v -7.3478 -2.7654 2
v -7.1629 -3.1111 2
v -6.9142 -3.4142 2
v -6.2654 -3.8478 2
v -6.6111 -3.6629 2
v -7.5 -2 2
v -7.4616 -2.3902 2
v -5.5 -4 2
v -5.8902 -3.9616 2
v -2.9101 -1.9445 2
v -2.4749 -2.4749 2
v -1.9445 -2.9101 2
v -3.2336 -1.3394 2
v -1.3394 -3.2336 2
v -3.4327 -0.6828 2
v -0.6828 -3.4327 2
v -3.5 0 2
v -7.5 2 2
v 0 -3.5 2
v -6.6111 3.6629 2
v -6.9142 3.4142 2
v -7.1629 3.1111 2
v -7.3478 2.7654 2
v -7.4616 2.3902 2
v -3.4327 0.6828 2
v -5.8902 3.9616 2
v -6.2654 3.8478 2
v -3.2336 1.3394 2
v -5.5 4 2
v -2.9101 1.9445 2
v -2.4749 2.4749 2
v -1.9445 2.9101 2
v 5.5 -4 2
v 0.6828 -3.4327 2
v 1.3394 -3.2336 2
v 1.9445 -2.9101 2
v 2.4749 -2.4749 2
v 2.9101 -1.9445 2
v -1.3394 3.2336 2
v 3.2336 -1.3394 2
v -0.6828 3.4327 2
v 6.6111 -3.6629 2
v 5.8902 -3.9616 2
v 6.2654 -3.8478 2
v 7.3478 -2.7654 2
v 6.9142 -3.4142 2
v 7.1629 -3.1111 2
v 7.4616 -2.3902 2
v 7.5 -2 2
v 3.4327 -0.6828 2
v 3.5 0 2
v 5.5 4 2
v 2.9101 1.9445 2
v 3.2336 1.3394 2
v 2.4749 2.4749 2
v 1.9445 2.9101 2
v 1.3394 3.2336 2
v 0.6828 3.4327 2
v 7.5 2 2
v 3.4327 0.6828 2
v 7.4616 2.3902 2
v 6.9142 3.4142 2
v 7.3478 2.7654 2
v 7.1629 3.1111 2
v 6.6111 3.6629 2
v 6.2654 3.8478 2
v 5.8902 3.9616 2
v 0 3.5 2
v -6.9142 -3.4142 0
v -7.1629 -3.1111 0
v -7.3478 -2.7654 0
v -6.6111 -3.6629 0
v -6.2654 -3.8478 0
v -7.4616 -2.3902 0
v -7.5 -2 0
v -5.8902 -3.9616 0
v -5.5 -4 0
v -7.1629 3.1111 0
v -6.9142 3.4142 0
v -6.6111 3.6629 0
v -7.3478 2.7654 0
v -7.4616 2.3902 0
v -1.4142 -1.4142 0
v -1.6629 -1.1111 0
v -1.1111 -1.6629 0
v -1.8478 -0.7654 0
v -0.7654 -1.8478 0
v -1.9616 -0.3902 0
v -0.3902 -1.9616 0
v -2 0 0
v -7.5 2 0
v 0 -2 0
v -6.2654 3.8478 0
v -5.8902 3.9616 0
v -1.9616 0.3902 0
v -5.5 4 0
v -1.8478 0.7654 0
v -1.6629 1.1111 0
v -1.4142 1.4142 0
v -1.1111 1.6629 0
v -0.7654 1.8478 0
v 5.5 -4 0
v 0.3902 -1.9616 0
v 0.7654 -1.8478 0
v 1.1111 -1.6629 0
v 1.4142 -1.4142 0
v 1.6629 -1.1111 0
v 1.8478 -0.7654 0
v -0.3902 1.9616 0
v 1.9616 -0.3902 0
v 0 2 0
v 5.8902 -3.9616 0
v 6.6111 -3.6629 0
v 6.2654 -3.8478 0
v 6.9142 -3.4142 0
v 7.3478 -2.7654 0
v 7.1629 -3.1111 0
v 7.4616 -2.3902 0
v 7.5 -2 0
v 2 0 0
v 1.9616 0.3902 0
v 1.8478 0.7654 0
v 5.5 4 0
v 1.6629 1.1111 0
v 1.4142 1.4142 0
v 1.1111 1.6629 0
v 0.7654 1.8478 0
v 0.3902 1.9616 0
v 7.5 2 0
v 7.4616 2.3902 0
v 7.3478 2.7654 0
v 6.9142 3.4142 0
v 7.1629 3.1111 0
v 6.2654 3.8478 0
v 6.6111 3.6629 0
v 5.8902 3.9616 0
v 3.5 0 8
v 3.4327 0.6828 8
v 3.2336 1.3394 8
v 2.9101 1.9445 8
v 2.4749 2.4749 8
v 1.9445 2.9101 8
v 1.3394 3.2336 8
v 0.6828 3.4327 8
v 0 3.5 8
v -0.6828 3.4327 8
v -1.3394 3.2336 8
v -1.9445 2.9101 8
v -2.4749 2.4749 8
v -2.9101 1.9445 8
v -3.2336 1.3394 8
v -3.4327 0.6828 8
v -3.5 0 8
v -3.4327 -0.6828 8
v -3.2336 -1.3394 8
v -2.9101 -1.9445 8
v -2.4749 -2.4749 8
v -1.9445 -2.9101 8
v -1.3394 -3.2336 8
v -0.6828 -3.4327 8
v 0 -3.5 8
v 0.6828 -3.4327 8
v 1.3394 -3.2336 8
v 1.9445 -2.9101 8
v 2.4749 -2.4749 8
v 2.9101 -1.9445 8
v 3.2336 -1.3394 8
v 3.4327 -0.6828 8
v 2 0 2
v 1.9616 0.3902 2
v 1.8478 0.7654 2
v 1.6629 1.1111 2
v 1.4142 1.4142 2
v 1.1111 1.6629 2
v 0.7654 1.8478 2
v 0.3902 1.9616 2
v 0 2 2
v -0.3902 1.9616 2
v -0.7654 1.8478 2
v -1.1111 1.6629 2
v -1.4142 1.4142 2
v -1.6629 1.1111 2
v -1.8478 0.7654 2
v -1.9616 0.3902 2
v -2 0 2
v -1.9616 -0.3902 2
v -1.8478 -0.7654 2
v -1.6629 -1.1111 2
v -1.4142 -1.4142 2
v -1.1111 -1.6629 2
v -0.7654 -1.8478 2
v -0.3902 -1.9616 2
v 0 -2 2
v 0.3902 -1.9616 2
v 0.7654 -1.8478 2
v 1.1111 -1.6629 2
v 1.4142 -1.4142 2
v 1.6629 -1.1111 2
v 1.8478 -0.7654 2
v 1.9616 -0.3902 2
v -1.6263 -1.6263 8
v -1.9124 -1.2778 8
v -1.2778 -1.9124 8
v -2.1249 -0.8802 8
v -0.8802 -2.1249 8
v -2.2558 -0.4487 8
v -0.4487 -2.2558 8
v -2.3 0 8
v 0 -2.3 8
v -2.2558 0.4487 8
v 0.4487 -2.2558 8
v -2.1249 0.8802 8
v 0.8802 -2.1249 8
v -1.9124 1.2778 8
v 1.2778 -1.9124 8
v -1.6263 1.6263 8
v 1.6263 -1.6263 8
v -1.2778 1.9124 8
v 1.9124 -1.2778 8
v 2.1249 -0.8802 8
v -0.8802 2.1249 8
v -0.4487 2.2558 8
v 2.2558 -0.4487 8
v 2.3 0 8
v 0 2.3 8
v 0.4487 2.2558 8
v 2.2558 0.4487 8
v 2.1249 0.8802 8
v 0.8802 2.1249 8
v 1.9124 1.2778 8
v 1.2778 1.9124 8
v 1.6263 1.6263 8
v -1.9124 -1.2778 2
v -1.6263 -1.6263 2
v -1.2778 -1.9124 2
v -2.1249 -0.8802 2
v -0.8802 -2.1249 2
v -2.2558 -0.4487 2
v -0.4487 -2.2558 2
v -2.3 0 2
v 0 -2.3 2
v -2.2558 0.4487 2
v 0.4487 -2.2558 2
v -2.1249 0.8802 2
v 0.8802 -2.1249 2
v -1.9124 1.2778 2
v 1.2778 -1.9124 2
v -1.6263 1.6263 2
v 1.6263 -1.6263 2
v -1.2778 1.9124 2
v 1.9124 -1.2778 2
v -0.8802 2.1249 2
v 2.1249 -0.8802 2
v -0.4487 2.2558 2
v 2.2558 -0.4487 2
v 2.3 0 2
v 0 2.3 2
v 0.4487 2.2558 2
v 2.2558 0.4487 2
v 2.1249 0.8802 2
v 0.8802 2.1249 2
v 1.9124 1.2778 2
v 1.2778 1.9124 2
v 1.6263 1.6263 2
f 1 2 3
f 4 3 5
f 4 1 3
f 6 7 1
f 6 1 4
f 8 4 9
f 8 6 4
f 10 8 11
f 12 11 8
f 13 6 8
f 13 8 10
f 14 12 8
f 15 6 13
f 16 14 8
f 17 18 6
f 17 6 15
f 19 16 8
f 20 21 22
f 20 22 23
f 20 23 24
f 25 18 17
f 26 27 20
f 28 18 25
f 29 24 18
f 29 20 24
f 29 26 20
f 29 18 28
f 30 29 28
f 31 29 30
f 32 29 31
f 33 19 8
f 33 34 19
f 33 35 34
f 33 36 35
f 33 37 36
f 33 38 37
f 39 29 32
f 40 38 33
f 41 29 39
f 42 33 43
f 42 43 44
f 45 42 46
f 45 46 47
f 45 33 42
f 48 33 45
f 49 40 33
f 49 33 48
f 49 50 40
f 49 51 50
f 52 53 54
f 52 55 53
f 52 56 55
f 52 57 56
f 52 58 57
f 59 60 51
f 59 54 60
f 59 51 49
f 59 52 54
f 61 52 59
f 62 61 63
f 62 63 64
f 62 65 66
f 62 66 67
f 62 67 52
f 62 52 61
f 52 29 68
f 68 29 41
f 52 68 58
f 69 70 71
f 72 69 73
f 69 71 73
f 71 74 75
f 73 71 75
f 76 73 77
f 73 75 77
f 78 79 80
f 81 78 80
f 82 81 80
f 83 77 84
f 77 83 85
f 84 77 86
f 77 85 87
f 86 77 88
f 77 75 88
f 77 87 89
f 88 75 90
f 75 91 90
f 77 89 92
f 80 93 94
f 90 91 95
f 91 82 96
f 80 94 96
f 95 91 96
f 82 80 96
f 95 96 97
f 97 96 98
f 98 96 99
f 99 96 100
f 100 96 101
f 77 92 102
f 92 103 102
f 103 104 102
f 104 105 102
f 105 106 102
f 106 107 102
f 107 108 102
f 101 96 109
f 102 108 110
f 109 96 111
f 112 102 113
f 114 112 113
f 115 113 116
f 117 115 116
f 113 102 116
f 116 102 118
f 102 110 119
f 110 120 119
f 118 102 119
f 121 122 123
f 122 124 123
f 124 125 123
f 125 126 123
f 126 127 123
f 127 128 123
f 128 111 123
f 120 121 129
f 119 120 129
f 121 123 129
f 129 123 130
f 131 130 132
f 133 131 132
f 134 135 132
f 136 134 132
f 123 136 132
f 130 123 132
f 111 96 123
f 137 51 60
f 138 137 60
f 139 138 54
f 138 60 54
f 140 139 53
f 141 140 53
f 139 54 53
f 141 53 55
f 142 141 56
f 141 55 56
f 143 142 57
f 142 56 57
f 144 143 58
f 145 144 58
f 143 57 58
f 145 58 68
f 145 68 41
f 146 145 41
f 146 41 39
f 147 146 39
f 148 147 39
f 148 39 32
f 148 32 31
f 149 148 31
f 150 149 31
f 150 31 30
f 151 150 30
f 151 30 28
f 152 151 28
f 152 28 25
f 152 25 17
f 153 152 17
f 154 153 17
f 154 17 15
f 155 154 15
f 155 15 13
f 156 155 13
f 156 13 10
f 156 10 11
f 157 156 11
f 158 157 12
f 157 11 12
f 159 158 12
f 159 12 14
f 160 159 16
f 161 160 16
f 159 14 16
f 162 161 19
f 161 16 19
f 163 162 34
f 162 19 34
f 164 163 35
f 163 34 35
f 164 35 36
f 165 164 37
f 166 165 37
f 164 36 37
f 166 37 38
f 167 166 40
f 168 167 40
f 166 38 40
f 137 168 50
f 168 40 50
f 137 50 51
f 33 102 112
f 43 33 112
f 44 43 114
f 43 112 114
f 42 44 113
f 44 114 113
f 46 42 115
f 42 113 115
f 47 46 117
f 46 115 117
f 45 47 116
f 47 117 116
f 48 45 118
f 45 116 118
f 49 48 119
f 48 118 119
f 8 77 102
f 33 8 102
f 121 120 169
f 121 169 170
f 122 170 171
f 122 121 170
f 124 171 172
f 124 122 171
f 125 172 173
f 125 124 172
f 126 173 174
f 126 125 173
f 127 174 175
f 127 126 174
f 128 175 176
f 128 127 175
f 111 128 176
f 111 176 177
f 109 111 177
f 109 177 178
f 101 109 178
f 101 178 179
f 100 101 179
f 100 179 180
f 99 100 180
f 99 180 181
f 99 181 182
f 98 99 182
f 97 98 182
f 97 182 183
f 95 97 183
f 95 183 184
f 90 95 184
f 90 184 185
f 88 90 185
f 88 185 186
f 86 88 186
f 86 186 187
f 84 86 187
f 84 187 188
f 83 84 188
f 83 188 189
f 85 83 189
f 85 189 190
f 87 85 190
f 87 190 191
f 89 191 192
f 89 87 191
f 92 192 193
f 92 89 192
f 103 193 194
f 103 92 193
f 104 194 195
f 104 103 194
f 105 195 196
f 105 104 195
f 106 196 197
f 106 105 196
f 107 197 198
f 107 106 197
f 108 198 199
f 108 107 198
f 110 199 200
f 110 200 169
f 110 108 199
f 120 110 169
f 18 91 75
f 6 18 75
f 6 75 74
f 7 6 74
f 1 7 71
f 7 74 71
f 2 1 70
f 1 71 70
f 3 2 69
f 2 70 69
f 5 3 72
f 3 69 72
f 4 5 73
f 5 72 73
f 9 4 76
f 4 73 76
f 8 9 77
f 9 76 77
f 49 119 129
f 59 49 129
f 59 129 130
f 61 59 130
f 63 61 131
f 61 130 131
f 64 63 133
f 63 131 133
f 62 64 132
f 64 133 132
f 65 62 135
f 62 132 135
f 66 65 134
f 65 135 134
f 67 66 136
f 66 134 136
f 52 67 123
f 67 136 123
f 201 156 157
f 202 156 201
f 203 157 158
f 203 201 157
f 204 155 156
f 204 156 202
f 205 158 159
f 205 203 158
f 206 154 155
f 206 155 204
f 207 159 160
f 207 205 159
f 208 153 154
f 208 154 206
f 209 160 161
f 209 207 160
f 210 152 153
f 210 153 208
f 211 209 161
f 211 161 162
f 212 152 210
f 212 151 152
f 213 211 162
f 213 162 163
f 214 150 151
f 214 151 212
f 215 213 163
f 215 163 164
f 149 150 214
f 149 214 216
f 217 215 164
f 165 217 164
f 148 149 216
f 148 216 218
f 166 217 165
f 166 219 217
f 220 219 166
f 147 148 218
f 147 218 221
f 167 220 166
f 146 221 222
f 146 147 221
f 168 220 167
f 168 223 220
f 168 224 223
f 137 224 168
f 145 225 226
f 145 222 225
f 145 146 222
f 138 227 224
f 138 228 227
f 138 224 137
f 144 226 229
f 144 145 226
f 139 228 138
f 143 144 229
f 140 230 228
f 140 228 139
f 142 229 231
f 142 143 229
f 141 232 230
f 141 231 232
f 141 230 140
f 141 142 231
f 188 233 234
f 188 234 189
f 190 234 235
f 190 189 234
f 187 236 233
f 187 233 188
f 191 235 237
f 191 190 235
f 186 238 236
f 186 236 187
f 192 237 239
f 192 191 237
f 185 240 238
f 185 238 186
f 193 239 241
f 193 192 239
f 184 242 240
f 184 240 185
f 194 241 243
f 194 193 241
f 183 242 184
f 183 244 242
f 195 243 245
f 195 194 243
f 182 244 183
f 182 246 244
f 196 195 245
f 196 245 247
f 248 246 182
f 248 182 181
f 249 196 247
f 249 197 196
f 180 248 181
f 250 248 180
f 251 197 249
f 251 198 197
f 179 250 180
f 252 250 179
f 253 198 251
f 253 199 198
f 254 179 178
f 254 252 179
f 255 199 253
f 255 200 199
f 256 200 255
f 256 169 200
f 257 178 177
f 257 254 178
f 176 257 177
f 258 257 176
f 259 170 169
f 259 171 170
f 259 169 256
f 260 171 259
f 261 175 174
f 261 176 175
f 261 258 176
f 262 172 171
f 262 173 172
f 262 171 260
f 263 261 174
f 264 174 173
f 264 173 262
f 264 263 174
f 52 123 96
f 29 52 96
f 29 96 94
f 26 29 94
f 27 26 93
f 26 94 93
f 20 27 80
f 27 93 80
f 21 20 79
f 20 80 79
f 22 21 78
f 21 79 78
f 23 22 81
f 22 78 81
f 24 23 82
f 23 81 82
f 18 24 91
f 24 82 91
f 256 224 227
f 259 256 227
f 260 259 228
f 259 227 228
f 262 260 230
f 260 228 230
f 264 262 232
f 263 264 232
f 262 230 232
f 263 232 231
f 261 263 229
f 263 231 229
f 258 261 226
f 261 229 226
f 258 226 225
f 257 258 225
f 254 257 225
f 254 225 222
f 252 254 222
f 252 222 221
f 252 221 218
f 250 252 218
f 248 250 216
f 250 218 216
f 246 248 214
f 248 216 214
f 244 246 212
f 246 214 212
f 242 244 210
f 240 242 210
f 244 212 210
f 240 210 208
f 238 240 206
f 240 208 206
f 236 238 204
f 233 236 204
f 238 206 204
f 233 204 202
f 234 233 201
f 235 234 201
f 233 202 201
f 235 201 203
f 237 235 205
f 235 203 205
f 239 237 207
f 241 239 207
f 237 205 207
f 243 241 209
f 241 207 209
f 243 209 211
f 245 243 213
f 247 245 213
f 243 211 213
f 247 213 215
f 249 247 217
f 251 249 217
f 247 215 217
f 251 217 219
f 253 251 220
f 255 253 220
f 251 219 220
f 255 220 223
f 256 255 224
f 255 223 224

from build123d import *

# Parameters (mm, degrees)
F0_R     = 3.5
F0_R_2   = 2
F1_DEPTH = 8
F2_R     = 2.3
F2_R_2   = 2
F3_DEPTH = 6
F4_R     = 3.5
F5_DEPTH = 2


with BuildPart() as f1:
    # F0 (on Top) → F1 (new body)
    with BuildSketch(Plane.XY):
        Circle(F0_R)
        Circle(F0_R_2, mode=Mode.SUBTRACT)
    extrude(amount=F1_DEPTH)

    # F2 (on face) → F3 (cut)
    with BuildSketch(Plane.XY.offset(8)):
        Circle(F2_R)
        Circle(F2_R_2, mode=Mode.SUBTRACT)
    extrude(amount=-F3_DEPTH, mode=Mode.SUBTRACT)

    # F4 (on Top) → F5 (join)
    with BuildSketch(Plane.XY):
        with BuildLine():
            Line((5.5, 4), (-5.5, 4))
            ThreePointArc((-5.5, 4), (-6.914214, 3.414214), (-7.5, 2))
            Line((-7.5, 2), (-7.5, -2))
            ThreePointArc((-7.5, -2), (-6.914214, -3.414214), (-5.5, -4))
            Line((-5.5, -4), (5.5, -4))
            ThreePointArc((5.5, -4), (6.914214, -3.414214), (7.5, -2))
            Line((7.5, -2), (7.5, 2))
            ThreePointArc((7.5, 2), (6.914214, 3.414214), (5.5, 4))
        make_face()
        Circle(F4_R, mode=Mode.SUBTRACT)
    extrude(amount=F5_DEPTH)


solid = f1.part
